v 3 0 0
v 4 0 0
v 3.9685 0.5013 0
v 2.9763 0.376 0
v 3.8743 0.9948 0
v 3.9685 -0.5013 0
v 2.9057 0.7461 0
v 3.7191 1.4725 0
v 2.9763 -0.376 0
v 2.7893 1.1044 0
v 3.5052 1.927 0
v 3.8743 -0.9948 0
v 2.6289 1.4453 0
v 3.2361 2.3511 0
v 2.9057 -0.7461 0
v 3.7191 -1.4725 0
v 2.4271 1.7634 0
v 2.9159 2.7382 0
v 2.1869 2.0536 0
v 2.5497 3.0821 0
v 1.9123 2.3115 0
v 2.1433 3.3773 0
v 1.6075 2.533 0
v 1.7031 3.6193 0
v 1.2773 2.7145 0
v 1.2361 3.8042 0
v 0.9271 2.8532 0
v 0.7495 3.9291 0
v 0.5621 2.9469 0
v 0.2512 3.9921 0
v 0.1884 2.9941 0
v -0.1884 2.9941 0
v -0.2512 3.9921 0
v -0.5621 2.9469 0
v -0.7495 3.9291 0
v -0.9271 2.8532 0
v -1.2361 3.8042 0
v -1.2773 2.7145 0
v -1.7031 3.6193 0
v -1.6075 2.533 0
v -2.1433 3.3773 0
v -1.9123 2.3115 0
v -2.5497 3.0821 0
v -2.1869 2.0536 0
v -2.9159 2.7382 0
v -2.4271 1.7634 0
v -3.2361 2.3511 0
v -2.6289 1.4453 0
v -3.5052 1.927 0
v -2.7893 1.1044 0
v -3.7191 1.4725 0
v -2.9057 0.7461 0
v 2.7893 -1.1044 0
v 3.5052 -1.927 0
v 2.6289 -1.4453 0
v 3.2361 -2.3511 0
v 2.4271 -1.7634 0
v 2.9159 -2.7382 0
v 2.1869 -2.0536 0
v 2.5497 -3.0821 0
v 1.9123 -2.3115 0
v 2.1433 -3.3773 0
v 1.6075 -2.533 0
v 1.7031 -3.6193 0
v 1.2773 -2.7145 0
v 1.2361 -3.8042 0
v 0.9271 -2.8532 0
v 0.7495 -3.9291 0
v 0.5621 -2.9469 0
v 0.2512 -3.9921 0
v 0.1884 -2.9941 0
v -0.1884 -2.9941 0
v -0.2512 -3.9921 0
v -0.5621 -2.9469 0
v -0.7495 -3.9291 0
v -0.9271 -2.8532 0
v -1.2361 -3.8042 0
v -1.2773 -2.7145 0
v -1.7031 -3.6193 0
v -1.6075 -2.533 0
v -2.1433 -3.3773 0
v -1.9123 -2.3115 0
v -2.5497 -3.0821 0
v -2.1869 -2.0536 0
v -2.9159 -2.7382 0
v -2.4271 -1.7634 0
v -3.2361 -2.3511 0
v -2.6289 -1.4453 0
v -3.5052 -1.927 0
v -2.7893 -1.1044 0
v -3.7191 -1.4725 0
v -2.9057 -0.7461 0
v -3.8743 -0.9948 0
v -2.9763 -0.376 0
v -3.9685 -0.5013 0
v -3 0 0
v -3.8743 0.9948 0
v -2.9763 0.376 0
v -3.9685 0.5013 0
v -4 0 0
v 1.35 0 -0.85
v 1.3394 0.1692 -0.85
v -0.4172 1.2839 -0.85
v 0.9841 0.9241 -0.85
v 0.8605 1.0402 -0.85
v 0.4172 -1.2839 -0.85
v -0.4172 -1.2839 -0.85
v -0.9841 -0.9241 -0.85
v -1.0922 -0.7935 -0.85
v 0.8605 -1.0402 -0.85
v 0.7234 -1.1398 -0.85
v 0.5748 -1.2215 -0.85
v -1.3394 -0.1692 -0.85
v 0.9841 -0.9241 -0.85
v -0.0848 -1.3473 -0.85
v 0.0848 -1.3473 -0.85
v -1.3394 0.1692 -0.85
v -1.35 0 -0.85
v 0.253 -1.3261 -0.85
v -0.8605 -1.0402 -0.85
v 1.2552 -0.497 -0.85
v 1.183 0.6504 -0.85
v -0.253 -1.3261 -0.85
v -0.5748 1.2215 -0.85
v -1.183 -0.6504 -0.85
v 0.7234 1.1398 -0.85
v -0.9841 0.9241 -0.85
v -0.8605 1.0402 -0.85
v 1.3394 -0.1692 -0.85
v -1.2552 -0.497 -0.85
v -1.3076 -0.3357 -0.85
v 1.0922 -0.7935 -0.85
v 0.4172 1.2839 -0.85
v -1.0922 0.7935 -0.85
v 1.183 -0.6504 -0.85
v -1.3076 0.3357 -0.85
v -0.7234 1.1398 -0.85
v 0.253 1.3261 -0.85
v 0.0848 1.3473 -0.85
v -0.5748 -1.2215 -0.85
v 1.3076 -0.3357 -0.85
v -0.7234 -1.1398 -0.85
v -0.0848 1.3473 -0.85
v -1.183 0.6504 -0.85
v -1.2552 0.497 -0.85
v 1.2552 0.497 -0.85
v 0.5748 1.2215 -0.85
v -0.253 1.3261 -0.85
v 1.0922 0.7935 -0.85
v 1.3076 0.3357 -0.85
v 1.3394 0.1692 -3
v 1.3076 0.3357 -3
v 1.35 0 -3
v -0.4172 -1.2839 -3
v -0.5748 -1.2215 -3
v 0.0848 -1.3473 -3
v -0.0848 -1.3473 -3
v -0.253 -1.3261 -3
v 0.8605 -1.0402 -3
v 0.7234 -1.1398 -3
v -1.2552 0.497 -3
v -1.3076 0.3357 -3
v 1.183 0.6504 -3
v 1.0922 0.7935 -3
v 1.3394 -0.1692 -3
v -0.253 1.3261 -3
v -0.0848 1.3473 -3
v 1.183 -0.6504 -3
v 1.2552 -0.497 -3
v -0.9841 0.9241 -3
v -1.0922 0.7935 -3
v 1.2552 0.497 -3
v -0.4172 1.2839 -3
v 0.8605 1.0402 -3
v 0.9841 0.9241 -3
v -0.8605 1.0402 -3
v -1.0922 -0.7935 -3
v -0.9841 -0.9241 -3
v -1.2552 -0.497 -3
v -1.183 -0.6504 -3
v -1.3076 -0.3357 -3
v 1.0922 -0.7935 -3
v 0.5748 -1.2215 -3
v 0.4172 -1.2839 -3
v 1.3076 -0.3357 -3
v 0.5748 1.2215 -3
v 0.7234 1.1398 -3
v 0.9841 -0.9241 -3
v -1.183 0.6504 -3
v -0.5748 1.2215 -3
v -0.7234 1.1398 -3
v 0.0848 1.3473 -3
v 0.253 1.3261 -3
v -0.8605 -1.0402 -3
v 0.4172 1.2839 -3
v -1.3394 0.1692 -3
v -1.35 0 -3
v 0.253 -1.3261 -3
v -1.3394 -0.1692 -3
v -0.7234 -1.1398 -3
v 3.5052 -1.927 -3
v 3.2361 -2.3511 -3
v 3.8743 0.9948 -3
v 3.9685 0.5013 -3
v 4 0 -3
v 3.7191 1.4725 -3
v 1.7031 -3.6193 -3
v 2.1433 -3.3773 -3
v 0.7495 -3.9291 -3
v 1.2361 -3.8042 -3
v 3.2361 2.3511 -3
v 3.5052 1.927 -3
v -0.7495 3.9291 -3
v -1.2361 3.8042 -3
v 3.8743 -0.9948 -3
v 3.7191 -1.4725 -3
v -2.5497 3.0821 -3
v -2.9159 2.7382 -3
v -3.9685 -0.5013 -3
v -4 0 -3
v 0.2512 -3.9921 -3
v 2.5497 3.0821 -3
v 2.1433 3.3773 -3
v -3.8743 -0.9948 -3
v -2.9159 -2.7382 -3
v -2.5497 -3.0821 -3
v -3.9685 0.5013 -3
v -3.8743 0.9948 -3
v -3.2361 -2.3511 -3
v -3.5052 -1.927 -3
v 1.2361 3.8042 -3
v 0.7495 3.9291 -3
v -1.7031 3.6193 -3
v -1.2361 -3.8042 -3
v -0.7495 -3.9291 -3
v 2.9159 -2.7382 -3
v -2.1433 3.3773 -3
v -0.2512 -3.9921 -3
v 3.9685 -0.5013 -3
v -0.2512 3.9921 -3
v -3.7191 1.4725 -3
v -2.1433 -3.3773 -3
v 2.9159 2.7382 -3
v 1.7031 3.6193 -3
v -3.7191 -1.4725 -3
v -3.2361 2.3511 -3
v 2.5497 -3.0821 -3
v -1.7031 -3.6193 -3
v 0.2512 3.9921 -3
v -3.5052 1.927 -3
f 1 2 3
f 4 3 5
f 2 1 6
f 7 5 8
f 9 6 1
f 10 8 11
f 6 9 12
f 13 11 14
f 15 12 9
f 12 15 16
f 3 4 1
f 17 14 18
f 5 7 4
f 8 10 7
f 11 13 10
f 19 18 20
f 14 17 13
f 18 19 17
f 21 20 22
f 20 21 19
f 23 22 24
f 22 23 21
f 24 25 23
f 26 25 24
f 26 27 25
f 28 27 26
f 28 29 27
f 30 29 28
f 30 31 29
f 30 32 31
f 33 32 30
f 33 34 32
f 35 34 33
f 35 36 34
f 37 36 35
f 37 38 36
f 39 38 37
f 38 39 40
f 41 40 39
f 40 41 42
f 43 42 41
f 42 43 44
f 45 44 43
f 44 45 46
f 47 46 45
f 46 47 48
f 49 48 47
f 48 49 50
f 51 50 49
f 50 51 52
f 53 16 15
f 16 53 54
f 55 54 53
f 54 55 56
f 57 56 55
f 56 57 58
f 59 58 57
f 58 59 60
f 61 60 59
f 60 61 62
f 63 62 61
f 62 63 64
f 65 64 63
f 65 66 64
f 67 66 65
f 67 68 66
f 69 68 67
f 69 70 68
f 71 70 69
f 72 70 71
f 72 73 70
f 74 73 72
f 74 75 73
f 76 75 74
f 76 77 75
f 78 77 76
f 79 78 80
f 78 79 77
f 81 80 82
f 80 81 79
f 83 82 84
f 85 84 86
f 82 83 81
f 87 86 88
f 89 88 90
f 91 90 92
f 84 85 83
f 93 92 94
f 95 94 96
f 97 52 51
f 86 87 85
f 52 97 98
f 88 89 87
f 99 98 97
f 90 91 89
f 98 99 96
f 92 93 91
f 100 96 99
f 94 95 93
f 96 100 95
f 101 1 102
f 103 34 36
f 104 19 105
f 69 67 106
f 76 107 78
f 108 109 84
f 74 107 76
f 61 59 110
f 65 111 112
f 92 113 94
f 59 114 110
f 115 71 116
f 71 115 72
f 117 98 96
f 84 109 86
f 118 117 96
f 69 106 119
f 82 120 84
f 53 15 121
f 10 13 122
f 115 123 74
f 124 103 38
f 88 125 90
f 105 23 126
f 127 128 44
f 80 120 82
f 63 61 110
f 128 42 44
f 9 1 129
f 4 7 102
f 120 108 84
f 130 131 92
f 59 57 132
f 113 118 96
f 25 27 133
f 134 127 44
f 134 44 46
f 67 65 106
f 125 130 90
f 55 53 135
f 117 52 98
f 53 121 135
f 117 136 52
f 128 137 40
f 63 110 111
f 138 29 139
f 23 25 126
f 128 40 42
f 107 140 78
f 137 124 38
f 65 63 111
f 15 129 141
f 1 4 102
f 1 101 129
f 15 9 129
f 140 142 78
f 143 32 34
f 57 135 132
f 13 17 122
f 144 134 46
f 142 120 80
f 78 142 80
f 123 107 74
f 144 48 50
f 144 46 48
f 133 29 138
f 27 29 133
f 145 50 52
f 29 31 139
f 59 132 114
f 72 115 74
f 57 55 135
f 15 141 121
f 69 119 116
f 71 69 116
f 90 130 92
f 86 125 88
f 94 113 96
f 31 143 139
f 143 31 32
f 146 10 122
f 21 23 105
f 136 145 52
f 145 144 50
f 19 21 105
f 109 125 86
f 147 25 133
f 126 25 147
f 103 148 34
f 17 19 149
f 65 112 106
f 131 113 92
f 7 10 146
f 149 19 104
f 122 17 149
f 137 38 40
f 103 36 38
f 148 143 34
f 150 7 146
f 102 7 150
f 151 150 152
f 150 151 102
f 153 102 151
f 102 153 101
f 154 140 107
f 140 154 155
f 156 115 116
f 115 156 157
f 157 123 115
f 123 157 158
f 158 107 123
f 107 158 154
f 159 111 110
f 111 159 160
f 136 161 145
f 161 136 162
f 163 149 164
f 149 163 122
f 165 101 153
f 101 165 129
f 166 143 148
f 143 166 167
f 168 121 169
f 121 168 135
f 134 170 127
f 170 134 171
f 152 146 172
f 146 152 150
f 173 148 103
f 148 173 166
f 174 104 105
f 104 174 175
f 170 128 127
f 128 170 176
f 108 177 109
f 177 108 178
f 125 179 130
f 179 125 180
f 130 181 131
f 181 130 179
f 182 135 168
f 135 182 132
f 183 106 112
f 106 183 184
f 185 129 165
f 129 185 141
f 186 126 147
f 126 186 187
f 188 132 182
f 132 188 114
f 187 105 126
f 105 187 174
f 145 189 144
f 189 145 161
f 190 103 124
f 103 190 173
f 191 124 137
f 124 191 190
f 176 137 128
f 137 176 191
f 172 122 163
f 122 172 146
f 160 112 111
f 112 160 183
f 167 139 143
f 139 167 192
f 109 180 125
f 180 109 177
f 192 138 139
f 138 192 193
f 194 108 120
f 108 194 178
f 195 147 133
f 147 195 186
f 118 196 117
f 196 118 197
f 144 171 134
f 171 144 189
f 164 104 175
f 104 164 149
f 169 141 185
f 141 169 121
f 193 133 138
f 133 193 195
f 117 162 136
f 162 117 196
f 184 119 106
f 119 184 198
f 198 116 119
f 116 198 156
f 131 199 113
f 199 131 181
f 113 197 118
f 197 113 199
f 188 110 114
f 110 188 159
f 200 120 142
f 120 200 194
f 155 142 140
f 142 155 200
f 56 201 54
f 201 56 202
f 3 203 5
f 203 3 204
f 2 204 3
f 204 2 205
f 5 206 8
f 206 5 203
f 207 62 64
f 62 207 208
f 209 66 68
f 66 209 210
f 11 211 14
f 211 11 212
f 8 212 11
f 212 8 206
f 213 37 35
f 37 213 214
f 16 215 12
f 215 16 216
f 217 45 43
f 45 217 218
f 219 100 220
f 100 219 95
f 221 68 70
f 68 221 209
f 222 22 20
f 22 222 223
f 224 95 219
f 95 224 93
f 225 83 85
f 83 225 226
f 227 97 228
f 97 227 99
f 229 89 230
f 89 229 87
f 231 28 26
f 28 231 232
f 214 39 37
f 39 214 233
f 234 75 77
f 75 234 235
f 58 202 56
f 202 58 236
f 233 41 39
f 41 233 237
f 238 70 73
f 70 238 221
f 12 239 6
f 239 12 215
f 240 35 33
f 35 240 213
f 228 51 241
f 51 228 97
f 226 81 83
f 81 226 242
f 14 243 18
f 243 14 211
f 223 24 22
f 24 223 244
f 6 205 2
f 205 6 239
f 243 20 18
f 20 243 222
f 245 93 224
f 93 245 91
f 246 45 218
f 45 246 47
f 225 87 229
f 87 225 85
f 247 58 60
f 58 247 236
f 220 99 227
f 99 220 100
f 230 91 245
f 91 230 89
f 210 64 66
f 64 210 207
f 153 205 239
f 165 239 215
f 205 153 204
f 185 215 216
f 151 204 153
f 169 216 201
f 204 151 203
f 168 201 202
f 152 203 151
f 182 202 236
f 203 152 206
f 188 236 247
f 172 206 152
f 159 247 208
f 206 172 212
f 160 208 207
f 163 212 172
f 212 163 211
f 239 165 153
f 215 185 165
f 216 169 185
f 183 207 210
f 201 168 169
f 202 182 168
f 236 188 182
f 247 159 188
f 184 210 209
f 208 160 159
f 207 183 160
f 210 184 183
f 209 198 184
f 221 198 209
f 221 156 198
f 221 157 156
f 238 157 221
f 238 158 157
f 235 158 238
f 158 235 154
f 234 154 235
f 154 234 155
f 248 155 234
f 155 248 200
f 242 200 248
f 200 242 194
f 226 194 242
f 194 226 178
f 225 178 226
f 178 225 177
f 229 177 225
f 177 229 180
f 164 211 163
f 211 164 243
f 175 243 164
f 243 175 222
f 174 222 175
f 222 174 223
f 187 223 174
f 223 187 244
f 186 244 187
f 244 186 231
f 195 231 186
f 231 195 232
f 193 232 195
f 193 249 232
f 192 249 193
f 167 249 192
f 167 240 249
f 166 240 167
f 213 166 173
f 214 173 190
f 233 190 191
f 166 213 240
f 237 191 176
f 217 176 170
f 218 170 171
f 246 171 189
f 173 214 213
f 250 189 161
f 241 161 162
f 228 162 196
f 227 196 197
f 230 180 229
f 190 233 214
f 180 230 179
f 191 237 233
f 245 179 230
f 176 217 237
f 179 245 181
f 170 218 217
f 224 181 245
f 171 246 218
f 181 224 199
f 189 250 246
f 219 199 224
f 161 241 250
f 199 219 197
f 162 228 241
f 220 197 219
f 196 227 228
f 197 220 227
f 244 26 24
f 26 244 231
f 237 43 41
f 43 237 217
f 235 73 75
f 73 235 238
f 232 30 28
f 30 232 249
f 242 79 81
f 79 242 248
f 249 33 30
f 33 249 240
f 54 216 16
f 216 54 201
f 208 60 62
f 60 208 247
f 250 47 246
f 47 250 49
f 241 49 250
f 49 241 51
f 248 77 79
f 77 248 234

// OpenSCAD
$fn = 50;

difference() {
	union() {
		translate(v = [0, 0, -3.0]) {
			cylinder(h = 6, r = 4.0);
		}
	}
	union() {
		translate(v = [0, 0, 0]) {
			rotate(a = [0, 0, 0]) {
				difference() {
					union() {
						translate(v = [0, 0, -6.0]) {
							cylinder(h = 6, r = 1.0);
						}
						translate(v = [0, 0, -0.85]) {
							cylinder(h = 0.85, r1 = 1.35, r2 = 3.0);
						}
						translate(v = [0, 0, -6.0]) {
							cylinder(h = 6, r = 1.35);
						}
						translate(v = [0, 0, -6.0]) {
							cylinder(h = 6, r = 1.0);
						}
					}
					union();
				}
			}
		}
		#cylinder(h = 3, r = 5.0);
	}
}
